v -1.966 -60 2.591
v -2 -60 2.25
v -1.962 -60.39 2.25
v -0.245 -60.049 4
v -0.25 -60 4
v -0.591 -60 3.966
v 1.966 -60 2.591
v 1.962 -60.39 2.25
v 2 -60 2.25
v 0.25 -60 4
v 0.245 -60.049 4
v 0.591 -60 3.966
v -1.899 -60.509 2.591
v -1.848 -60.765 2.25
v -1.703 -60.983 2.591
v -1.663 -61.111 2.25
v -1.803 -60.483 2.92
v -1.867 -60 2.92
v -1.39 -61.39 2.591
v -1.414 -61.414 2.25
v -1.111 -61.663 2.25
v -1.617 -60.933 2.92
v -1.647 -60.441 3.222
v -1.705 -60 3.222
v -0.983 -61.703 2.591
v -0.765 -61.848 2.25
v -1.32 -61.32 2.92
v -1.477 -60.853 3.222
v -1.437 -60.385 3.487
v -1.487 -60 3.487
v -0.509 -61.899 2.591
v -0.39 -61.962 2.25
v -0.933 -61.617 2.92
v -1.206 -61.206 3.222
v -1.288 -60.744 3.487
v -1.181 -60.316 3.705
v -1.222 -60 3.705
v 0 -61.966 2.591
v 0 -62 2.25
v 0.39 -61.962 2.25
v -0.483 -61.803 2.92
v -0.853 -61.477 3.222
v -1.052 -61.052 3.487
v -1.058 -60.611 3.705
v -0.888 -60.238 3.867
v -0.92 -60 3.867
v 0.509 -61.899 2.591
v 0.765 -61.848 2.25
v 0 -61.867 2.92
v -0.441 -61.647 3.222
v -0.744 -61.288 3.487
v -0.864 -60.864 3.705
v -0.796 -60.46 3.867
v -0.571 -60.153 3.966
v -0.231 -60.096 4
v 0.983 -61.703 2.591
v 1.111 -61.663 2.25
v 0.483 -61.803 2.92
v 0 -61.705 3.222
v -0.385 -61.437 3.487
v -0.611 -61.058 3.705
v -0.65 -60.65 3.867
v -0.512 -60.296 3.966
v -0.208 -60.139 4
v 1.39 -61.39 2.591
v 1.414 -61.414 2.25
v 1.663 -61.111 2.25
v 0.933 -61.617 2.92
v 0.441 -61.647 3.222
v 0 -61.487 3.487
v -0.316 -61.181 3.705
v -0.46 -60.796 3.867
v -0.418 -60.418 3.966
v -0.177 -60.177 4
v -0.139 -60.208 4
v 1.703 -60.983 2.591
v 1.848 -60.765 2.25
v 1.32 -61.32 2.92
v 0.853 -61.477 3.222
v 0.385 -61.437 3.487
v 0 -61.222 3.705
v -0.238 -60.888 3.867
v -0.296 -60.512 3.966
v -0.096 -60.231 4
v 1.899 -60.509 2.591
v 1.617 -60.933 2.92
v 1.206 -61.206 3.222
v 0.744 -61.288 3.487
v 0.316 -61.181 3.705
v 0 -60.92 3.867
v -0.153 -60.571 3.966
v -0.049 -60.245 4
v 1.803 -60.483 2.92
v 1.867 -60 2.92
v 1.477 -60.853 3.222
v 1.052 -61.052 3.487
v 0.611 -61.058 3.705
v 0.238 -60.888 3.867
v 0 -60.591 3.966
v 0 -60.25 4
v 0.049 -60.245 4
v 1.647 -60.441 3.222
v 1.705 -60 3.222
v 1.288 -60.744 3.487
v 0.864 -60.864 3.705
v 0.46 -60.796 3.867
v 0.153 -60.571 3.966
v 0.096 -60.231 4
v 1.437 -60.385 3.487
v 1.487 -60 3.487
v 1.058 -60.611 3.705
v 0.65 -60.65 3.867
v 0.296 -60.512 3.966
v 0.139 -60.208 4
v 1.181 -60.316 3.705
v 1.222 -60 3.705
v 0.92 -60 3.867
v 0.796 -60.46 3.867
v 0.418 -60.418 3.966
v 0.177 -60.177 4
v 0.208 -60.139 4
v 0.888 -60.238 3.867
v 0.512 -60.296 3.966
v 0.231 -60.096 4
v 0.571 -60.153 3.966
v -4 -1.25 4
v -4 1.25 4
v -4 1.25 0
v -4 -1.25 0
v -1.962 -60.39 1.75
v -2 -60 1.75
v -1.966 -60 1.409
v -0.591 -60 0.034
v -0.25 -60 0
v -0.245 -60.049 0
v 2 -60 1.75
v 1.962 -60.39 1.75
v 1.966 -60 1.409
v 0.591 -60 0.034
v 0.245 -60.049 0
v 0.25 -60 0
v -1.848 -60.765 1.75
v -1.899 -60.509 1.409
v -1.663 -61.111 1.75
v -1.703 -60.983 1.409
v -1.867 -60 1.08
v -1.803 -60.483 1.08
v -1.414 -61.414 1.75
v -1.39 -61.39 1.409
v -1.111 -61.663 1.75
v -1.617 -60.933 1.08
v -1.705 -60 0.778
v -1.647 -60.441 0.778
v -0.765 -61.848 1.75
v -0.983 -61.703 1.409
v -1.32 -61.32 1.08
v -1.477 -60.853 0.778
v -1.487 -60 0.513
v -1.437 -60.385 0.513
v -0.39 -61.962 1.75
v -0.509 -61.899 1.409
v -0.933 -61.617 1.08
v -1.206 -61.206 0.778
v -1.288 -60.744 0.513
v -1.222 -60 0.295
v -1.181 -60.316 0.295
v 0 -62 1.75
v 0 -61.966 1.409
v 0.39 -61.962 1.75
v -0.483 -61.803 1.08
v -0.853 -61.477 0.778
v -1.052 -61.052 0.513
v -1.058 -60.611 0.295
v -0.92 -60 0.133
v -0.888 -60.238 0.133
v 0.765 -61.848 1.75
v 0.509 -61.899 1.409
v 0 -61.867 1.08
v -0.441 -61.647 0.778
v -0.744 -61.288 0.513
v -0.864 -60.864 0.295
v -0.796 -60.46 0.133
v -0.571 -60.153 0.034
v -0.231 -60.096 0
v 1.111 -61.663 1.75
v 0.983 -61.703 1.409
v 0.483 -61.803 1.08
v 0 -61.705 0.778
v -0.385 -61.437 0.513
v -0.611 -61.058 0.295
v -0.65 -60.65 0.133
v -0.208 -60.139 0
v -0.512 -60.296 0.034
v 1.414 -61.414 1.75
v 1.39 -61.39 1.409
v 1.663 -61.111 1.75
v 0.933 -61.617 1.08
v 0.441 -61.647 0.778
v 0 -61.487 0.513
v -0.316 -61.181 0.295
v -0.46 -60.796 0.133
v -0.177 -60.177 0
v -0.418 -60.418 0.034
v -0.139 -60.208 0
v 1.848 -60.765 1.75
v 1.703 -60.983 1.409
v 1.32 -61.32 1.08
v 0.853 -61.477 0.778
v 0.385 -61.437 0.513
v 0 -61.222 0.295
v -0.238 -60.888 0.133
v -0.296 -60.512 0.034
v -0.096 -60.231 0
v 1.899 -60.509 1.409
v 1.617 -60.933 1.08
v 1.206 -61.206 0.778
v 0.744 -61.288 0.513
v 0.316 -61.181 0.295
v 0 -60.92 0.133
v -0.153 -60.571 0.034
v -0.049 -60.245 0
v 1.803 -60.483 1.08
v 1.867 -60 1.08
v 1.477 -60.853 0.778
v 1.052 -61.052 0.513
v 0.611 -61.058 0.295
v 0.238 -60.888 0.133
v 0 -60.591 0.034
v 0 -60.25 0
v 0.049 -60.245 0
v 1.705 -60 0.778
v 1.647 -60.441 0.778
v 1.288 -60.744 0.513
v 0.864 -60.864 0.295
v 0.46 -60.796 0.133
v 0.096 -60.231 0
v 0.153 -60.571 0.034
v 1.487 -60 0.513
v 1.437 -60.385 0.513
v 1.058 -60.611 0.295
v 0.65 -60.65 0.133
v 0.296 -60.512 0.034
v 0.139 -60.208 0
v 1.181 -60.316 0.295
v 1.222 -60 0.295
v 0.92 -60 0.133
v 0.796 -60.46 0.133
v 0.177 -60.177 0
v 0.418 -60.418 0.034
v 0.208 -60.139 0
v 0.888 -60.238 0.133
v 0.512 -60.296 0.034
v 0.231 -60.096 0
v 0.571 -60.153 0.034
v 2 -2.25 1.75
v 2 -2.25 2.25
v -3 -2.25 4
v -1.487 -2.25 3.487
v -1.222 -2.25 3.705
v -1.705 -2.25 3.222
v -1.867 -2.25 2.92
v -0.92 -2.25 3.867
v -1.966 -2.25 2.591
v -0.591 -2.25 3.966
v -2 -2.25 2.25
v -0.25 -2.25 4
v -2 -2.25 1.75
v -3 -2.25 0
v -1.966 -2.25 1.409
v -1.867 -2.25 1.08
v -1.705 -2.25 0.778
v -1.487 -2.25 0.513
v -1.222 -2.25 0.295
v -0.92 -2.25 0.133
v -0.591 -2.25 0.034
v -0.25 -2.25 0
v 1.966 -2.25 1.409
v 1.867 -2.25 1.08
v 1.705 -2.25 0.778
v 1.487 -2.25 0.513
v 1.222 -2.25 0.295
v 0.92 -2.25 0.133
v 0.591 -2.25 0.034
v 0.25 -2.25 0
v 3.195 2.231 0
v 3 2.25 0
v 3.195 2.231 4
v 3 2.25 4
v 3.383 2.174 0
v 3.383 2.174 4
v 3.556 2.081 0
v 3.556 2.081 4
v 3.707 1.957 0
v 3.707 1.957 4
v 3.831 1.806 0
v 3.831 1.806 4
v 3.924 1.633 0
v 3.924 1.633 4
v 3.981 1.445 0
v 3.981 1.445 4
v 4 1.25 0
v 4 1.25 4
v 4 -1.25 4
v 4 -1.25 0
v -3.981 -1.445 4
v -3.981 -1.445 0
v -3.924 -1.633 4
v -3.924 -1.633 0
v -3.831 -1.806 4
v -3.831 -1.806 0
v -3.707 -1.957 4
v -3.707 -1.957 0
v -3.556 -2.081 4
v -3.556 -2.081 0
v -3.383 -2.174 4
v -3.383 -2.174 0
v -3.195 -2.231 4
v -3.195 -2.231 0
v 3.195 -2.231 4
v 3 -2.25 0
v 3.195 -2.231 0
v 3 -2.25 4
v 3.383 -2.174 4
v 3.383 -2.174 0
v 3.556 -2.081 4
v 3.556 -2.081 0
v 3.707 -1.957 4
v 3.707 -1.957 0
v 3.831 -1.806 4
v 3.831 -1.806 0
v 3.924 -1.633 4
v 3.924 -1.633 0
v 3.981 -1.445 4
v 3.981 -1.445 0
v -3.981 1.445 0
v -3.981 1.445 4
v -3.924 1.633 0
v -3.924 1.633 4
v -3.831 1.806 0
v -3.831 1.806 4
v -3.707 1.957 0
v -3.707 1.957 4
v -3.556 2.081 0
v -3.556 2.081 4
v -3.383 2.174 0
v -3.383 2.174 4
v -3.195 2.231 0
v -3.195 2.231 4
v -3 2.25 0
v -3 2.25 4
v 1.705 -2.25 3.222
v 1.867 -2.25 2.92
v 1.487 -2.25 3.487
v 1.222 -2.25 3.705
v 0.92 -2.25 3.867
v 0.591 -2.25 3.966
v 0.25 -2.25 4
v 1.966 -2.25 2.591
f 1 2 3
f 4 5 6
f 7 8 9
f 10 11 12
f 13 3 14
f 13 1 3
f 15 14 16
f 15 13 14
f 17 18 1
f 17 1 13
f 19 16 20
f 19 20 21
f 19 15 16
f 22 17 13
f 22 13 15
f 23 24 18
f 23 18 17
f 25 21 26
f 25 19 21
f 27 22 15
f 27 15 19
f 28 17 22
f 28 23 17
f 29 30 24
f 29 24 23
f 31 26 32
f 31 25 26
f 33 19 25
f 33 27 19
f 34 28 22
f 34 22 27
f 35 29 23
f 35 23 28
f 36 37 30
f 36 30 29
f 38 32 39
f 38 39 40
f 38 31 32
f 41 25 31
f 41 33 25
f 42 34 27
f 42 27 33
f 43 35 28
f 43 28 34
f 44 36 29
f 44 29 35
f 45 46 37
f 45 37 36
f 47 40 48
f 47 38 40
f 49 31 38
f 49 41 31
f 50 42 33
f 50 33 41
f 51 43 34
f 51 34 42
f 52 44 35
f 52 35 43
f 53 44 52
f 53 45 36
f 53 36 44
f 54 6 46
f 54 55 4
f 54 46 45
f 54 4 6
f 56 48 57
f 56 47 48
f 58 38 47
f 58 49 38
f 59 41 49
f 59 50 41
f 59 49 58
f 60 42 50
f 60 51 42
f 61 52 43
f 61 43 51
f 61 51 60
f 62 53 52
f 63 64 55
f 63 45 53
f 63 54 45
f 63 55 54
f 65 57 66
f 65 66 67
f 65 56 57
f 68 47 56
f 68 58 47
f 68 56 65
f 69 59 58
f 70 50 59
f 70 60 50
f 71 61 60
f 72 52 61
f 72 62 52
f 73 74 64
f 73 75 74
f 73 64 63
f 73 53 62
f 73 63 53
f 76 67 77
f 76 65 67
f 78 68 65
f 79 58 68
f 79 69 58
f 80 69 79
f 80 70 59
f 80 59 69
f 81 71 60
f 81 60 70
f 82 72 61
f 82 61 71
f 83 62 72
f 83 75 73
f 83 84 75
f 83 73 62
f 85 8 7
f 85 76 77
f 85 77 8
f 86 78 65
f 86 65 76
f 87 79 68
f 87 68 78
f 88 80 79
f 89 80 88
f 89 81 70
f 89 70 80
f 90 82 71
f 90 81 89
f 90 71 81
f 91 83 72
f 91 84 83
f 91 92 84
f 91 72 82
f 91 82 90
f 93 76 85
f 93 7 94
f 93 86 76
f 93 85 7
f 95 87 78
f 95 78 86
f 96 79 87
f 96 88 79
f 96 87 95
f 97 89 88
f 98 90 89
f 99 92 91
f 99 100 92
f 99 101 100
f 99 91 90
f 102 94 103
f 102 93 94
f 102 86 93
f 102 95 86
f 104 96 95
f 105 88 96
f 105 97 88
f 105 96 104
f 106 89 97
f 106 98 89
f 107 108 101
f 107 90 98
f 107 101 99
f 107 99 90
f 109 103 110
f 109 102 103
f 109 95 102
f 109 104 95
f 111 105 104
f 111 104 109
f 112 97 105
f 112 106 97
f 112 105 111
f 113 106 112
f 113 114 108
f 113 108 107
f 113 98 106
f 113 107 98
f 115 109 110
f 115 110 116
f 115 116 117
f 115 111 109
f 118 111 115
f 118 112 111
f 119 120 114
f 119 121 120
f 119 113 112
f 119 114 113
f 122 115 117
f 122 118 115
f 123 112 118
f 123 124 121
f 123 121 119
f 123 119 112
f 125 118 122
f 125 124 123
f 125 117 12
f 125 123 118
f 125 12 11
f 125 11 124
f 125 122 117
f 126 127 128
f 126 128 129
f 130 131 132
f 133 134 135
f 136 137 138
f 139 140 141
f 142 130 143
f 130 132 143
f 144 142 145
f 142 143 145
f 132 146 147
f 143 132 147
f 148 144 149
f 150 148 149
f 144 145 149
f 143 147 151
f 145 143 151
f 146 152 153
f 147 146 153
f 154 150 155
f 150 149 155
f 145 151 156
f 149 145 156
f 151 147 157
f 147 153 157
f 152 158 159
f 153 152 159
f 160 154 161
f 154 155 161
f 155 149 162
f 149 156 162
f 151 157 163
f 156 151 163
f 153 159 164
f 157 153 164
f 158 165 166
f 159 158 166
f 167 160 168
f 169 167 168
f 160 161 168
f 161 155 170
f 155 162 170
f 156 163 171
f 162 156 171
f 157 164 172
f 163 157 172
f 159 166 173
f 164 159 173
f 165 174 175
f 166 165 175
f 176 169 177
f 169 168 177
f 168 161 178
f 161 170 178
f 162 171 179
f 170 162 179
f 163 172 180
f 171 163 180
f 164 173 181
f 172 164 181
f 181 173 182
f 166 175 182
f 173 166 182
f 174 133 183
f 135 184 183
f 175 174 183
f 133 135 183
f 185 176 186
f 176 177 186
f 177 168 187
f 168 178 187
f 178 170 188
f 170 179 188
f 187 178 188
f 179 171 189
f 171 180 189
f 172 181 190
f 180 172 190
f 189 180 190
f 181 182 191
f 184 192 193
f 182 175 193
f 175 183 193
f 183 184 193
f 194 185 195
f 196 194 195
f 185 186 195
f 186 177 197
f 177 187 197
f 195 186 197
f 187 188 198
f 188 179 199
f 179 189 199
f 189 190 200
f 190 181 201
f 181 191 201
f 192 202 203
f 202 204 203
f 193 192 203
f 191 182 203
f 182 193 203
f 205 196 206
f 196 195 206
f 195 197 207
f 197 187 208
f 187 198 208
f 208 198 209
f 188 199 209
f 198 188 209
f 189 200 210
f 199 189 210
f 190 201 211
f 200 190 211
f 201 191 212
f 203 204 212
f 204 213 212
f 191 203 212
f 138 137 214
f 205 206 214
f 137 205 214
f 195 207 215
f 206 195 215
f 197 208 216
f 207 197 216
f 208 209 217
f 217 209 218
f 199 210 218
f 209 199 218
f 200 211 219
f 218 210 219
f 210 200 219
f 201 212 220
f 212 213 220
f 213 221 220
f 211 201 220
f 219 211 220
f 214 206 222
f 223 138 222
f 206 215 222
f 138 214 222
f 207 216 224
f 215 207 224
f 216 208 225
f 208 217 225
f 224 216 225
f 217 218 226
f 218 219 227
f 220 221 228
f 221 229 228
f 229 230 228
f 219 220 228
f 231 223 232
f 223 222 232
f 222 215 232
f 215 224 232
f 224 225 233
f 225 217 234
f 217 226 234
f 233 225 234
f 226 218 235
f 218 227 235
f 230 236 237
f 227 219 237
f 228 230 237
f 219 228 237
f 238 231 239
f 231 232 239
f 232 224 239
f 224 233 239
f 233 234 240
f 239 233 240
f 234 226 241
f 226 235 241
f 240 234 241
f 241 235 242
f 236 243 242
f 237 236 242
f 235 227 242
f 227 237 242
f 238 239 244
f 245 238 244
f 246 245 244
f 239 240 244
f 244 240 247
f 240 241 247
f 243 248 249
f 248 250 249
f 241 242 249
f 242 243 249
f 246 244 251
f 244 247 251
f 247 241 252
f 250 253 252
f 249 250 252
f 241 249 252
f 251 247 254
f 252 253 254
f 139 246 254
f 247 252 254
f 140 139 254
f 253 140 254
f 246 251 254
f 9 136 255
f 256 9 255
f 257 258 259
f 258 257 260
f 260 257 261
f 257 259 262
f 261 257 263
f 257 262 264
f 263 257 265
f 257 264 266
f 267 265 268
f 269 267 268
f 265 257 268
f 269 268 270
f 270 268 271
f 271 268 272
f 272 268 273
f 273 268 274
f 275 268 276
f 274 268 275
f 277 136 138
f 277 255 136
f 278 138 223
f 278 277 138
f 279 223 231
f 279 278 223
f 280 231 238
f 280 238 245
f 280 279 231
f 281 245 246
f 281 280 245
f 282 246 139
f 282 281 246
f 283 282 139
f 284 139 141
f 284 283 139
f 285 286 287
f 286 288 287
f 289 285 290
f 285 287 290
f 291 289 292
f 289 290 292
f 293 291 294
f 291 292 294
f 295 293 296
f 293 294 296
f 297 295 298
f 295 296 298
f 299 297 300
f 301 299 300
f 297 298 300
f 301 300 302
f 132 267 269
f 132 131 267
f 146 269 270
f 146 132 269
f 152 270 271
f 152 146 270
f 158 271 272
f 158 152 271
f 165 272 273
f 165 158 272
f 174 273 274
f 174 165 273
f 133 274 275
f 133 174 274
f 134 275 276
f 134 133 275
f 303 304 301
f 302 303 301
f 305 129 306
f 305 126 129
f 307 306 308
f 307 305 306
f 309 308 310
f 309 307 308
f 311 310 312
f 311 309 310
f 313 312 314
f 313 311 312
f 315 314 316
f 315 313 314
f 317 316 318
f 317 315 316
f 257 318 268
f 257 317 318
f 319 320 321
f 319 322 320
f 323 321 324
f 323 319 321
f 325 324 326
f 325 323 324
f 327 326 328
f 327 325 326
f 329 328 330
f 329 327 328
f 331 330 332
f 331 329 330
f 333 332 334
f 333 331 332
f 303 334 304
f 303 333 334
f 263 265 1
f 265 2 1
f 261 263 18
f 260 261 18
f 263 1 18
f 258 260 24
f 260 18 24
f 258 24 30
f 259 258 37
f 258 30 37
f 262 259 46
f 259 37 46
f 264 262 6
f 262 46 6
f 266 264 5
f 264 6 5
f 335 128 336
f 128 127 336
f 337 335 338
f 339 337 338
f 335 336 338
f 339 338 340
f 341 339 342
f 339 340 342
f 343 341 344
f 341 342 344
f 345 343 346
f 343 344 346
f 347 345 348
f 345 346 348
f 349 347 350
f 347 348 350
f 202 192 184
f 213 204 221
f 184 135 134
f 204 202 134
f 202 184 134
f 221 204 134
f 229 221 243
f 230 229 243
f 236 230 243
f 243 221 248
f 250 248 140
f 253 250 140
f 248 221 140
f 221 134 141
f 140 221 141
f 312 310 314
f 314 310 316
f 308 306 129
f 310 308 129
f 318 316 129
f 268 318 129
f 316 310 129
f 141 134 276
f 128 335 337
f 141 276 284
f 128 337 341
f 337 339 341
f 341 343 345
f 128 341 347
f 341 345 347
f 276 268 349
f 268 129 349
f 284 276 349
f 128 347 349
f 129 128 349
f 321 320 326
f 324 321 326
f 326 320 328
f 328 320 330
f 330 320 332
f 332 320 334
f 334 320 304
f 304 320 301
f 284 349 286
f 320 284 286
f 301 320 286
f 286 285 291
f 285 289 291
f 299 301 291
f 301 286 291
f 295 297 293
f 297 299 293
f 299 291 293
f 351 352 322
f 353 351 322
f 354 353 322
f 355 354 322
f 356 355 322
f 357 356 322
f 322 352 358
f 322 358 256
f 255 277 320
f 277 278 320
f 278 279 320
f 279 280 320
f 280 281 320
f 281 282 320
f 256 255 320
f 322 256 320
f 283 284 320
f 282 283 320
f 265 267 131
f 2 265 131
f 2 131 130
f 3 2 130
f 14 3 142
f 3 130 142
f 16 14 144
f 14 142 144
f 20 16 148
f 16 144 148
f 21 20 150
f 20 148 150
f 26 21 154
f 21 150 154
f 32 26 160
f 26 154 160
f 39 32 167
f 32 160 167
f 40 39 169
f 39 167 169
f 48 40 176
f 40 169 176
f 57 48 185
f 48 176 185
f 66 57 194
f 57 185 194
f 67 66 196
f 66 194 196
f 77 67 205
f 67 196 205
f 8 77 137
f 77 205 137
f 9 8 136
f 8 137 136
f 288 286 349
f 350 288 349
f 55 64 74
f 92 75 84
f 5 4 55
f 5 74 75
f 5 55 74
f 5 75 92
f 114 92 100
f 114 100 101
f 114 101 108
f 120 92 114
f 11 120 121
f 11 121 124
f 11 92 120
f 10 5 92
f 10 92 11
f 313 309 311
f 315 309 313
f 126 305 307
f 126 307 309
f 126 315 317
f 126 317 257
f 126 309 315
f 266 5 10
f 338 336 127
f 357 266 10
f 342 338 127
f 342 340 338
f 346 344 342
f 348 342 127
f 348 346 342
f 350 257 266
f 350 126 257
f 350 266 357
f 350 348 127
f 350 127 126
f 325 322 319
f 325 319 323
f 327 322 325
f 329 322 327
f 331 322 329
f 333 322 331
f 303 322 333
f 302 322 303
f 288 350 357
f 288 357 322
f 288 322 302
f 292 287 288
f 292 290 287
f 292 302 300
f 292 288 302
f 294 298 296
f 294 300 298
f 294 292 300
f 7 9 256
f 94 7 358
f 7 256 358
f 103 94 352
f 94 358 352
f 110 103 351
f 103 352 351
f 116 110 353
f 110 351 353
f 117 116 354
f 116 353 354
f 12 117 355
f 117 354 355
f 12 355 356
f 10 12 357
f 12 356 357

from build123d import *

# Parameters (mm, degrees)
BOSS_EXTRUDE1_DEPTH = 4
FILLET1_R           = 1.75
FILLET2_R           = 1


with BuildPart() as part:
    # Sketch1 → Boss-Extrude1 (new body)
    with BuildSketch(Plane.XY):
        with BuildLine():
            Line((2, -2.25), (-2, -2.25))
            Line((-2, -2.25), (-2, -60))
            ThreePointArc((-2, -60), (0, -62), (2, -60))
            Line((2, -60), (2, -2.25))
        make_face()
        with BuildLine():
            Line((-2, 0), (-2, -2.25))
            Line((-2, -2.25), (2, -2.25))
            Line((2, -2.25), (2, 0))
            ThreePointArc((2, 0), (0, 2), (-2, 0))
        make_face()
        with BuildLine():
            Line((-4, 2.25), (-4, -2.25))
            Line((-4, -2.25), (-2, -2.25))
            Line((-2, -2.25), (-2, 0))
            ThreePointArc((-2, 0), (0, 2), (2, 0))
            Line((2, 0), (2, -2.25))
            Line((2, -2.25), (4, -2.25))
            Line((4, -2.25), (4, 2.25))
            Line((4, 2.25), (-4, 2.25))
        make_face()
    extrude(amount=BOSS_EXTRUDE1_DEPTH)

    # Fillet1
    fillet1_edges = [part.edges().sort_by_distance(p)[0] for p in [
        (2, -31.125, 0),
        (0, -62, 0),
        (-2, -31.125, 0),
        (0, -62, 4),
        (2, -31.125, 4),
        (-2, -31.125, 4),
    ]]
    fillet(fillet1_edges, radius=FILLET1_R)

    # Fillet2
    fillet2_edges = [part.edges().sort_by_distance(p)[0] for p in [
        (-4, -2.25, 2),
        (-4, 2.25, 2),
        (4, 2.25, 2),
        (4, -2.25, 2),
    ]]
    fillet(fillet2_edges, radius=FILLET2_R)


solid = part.part
